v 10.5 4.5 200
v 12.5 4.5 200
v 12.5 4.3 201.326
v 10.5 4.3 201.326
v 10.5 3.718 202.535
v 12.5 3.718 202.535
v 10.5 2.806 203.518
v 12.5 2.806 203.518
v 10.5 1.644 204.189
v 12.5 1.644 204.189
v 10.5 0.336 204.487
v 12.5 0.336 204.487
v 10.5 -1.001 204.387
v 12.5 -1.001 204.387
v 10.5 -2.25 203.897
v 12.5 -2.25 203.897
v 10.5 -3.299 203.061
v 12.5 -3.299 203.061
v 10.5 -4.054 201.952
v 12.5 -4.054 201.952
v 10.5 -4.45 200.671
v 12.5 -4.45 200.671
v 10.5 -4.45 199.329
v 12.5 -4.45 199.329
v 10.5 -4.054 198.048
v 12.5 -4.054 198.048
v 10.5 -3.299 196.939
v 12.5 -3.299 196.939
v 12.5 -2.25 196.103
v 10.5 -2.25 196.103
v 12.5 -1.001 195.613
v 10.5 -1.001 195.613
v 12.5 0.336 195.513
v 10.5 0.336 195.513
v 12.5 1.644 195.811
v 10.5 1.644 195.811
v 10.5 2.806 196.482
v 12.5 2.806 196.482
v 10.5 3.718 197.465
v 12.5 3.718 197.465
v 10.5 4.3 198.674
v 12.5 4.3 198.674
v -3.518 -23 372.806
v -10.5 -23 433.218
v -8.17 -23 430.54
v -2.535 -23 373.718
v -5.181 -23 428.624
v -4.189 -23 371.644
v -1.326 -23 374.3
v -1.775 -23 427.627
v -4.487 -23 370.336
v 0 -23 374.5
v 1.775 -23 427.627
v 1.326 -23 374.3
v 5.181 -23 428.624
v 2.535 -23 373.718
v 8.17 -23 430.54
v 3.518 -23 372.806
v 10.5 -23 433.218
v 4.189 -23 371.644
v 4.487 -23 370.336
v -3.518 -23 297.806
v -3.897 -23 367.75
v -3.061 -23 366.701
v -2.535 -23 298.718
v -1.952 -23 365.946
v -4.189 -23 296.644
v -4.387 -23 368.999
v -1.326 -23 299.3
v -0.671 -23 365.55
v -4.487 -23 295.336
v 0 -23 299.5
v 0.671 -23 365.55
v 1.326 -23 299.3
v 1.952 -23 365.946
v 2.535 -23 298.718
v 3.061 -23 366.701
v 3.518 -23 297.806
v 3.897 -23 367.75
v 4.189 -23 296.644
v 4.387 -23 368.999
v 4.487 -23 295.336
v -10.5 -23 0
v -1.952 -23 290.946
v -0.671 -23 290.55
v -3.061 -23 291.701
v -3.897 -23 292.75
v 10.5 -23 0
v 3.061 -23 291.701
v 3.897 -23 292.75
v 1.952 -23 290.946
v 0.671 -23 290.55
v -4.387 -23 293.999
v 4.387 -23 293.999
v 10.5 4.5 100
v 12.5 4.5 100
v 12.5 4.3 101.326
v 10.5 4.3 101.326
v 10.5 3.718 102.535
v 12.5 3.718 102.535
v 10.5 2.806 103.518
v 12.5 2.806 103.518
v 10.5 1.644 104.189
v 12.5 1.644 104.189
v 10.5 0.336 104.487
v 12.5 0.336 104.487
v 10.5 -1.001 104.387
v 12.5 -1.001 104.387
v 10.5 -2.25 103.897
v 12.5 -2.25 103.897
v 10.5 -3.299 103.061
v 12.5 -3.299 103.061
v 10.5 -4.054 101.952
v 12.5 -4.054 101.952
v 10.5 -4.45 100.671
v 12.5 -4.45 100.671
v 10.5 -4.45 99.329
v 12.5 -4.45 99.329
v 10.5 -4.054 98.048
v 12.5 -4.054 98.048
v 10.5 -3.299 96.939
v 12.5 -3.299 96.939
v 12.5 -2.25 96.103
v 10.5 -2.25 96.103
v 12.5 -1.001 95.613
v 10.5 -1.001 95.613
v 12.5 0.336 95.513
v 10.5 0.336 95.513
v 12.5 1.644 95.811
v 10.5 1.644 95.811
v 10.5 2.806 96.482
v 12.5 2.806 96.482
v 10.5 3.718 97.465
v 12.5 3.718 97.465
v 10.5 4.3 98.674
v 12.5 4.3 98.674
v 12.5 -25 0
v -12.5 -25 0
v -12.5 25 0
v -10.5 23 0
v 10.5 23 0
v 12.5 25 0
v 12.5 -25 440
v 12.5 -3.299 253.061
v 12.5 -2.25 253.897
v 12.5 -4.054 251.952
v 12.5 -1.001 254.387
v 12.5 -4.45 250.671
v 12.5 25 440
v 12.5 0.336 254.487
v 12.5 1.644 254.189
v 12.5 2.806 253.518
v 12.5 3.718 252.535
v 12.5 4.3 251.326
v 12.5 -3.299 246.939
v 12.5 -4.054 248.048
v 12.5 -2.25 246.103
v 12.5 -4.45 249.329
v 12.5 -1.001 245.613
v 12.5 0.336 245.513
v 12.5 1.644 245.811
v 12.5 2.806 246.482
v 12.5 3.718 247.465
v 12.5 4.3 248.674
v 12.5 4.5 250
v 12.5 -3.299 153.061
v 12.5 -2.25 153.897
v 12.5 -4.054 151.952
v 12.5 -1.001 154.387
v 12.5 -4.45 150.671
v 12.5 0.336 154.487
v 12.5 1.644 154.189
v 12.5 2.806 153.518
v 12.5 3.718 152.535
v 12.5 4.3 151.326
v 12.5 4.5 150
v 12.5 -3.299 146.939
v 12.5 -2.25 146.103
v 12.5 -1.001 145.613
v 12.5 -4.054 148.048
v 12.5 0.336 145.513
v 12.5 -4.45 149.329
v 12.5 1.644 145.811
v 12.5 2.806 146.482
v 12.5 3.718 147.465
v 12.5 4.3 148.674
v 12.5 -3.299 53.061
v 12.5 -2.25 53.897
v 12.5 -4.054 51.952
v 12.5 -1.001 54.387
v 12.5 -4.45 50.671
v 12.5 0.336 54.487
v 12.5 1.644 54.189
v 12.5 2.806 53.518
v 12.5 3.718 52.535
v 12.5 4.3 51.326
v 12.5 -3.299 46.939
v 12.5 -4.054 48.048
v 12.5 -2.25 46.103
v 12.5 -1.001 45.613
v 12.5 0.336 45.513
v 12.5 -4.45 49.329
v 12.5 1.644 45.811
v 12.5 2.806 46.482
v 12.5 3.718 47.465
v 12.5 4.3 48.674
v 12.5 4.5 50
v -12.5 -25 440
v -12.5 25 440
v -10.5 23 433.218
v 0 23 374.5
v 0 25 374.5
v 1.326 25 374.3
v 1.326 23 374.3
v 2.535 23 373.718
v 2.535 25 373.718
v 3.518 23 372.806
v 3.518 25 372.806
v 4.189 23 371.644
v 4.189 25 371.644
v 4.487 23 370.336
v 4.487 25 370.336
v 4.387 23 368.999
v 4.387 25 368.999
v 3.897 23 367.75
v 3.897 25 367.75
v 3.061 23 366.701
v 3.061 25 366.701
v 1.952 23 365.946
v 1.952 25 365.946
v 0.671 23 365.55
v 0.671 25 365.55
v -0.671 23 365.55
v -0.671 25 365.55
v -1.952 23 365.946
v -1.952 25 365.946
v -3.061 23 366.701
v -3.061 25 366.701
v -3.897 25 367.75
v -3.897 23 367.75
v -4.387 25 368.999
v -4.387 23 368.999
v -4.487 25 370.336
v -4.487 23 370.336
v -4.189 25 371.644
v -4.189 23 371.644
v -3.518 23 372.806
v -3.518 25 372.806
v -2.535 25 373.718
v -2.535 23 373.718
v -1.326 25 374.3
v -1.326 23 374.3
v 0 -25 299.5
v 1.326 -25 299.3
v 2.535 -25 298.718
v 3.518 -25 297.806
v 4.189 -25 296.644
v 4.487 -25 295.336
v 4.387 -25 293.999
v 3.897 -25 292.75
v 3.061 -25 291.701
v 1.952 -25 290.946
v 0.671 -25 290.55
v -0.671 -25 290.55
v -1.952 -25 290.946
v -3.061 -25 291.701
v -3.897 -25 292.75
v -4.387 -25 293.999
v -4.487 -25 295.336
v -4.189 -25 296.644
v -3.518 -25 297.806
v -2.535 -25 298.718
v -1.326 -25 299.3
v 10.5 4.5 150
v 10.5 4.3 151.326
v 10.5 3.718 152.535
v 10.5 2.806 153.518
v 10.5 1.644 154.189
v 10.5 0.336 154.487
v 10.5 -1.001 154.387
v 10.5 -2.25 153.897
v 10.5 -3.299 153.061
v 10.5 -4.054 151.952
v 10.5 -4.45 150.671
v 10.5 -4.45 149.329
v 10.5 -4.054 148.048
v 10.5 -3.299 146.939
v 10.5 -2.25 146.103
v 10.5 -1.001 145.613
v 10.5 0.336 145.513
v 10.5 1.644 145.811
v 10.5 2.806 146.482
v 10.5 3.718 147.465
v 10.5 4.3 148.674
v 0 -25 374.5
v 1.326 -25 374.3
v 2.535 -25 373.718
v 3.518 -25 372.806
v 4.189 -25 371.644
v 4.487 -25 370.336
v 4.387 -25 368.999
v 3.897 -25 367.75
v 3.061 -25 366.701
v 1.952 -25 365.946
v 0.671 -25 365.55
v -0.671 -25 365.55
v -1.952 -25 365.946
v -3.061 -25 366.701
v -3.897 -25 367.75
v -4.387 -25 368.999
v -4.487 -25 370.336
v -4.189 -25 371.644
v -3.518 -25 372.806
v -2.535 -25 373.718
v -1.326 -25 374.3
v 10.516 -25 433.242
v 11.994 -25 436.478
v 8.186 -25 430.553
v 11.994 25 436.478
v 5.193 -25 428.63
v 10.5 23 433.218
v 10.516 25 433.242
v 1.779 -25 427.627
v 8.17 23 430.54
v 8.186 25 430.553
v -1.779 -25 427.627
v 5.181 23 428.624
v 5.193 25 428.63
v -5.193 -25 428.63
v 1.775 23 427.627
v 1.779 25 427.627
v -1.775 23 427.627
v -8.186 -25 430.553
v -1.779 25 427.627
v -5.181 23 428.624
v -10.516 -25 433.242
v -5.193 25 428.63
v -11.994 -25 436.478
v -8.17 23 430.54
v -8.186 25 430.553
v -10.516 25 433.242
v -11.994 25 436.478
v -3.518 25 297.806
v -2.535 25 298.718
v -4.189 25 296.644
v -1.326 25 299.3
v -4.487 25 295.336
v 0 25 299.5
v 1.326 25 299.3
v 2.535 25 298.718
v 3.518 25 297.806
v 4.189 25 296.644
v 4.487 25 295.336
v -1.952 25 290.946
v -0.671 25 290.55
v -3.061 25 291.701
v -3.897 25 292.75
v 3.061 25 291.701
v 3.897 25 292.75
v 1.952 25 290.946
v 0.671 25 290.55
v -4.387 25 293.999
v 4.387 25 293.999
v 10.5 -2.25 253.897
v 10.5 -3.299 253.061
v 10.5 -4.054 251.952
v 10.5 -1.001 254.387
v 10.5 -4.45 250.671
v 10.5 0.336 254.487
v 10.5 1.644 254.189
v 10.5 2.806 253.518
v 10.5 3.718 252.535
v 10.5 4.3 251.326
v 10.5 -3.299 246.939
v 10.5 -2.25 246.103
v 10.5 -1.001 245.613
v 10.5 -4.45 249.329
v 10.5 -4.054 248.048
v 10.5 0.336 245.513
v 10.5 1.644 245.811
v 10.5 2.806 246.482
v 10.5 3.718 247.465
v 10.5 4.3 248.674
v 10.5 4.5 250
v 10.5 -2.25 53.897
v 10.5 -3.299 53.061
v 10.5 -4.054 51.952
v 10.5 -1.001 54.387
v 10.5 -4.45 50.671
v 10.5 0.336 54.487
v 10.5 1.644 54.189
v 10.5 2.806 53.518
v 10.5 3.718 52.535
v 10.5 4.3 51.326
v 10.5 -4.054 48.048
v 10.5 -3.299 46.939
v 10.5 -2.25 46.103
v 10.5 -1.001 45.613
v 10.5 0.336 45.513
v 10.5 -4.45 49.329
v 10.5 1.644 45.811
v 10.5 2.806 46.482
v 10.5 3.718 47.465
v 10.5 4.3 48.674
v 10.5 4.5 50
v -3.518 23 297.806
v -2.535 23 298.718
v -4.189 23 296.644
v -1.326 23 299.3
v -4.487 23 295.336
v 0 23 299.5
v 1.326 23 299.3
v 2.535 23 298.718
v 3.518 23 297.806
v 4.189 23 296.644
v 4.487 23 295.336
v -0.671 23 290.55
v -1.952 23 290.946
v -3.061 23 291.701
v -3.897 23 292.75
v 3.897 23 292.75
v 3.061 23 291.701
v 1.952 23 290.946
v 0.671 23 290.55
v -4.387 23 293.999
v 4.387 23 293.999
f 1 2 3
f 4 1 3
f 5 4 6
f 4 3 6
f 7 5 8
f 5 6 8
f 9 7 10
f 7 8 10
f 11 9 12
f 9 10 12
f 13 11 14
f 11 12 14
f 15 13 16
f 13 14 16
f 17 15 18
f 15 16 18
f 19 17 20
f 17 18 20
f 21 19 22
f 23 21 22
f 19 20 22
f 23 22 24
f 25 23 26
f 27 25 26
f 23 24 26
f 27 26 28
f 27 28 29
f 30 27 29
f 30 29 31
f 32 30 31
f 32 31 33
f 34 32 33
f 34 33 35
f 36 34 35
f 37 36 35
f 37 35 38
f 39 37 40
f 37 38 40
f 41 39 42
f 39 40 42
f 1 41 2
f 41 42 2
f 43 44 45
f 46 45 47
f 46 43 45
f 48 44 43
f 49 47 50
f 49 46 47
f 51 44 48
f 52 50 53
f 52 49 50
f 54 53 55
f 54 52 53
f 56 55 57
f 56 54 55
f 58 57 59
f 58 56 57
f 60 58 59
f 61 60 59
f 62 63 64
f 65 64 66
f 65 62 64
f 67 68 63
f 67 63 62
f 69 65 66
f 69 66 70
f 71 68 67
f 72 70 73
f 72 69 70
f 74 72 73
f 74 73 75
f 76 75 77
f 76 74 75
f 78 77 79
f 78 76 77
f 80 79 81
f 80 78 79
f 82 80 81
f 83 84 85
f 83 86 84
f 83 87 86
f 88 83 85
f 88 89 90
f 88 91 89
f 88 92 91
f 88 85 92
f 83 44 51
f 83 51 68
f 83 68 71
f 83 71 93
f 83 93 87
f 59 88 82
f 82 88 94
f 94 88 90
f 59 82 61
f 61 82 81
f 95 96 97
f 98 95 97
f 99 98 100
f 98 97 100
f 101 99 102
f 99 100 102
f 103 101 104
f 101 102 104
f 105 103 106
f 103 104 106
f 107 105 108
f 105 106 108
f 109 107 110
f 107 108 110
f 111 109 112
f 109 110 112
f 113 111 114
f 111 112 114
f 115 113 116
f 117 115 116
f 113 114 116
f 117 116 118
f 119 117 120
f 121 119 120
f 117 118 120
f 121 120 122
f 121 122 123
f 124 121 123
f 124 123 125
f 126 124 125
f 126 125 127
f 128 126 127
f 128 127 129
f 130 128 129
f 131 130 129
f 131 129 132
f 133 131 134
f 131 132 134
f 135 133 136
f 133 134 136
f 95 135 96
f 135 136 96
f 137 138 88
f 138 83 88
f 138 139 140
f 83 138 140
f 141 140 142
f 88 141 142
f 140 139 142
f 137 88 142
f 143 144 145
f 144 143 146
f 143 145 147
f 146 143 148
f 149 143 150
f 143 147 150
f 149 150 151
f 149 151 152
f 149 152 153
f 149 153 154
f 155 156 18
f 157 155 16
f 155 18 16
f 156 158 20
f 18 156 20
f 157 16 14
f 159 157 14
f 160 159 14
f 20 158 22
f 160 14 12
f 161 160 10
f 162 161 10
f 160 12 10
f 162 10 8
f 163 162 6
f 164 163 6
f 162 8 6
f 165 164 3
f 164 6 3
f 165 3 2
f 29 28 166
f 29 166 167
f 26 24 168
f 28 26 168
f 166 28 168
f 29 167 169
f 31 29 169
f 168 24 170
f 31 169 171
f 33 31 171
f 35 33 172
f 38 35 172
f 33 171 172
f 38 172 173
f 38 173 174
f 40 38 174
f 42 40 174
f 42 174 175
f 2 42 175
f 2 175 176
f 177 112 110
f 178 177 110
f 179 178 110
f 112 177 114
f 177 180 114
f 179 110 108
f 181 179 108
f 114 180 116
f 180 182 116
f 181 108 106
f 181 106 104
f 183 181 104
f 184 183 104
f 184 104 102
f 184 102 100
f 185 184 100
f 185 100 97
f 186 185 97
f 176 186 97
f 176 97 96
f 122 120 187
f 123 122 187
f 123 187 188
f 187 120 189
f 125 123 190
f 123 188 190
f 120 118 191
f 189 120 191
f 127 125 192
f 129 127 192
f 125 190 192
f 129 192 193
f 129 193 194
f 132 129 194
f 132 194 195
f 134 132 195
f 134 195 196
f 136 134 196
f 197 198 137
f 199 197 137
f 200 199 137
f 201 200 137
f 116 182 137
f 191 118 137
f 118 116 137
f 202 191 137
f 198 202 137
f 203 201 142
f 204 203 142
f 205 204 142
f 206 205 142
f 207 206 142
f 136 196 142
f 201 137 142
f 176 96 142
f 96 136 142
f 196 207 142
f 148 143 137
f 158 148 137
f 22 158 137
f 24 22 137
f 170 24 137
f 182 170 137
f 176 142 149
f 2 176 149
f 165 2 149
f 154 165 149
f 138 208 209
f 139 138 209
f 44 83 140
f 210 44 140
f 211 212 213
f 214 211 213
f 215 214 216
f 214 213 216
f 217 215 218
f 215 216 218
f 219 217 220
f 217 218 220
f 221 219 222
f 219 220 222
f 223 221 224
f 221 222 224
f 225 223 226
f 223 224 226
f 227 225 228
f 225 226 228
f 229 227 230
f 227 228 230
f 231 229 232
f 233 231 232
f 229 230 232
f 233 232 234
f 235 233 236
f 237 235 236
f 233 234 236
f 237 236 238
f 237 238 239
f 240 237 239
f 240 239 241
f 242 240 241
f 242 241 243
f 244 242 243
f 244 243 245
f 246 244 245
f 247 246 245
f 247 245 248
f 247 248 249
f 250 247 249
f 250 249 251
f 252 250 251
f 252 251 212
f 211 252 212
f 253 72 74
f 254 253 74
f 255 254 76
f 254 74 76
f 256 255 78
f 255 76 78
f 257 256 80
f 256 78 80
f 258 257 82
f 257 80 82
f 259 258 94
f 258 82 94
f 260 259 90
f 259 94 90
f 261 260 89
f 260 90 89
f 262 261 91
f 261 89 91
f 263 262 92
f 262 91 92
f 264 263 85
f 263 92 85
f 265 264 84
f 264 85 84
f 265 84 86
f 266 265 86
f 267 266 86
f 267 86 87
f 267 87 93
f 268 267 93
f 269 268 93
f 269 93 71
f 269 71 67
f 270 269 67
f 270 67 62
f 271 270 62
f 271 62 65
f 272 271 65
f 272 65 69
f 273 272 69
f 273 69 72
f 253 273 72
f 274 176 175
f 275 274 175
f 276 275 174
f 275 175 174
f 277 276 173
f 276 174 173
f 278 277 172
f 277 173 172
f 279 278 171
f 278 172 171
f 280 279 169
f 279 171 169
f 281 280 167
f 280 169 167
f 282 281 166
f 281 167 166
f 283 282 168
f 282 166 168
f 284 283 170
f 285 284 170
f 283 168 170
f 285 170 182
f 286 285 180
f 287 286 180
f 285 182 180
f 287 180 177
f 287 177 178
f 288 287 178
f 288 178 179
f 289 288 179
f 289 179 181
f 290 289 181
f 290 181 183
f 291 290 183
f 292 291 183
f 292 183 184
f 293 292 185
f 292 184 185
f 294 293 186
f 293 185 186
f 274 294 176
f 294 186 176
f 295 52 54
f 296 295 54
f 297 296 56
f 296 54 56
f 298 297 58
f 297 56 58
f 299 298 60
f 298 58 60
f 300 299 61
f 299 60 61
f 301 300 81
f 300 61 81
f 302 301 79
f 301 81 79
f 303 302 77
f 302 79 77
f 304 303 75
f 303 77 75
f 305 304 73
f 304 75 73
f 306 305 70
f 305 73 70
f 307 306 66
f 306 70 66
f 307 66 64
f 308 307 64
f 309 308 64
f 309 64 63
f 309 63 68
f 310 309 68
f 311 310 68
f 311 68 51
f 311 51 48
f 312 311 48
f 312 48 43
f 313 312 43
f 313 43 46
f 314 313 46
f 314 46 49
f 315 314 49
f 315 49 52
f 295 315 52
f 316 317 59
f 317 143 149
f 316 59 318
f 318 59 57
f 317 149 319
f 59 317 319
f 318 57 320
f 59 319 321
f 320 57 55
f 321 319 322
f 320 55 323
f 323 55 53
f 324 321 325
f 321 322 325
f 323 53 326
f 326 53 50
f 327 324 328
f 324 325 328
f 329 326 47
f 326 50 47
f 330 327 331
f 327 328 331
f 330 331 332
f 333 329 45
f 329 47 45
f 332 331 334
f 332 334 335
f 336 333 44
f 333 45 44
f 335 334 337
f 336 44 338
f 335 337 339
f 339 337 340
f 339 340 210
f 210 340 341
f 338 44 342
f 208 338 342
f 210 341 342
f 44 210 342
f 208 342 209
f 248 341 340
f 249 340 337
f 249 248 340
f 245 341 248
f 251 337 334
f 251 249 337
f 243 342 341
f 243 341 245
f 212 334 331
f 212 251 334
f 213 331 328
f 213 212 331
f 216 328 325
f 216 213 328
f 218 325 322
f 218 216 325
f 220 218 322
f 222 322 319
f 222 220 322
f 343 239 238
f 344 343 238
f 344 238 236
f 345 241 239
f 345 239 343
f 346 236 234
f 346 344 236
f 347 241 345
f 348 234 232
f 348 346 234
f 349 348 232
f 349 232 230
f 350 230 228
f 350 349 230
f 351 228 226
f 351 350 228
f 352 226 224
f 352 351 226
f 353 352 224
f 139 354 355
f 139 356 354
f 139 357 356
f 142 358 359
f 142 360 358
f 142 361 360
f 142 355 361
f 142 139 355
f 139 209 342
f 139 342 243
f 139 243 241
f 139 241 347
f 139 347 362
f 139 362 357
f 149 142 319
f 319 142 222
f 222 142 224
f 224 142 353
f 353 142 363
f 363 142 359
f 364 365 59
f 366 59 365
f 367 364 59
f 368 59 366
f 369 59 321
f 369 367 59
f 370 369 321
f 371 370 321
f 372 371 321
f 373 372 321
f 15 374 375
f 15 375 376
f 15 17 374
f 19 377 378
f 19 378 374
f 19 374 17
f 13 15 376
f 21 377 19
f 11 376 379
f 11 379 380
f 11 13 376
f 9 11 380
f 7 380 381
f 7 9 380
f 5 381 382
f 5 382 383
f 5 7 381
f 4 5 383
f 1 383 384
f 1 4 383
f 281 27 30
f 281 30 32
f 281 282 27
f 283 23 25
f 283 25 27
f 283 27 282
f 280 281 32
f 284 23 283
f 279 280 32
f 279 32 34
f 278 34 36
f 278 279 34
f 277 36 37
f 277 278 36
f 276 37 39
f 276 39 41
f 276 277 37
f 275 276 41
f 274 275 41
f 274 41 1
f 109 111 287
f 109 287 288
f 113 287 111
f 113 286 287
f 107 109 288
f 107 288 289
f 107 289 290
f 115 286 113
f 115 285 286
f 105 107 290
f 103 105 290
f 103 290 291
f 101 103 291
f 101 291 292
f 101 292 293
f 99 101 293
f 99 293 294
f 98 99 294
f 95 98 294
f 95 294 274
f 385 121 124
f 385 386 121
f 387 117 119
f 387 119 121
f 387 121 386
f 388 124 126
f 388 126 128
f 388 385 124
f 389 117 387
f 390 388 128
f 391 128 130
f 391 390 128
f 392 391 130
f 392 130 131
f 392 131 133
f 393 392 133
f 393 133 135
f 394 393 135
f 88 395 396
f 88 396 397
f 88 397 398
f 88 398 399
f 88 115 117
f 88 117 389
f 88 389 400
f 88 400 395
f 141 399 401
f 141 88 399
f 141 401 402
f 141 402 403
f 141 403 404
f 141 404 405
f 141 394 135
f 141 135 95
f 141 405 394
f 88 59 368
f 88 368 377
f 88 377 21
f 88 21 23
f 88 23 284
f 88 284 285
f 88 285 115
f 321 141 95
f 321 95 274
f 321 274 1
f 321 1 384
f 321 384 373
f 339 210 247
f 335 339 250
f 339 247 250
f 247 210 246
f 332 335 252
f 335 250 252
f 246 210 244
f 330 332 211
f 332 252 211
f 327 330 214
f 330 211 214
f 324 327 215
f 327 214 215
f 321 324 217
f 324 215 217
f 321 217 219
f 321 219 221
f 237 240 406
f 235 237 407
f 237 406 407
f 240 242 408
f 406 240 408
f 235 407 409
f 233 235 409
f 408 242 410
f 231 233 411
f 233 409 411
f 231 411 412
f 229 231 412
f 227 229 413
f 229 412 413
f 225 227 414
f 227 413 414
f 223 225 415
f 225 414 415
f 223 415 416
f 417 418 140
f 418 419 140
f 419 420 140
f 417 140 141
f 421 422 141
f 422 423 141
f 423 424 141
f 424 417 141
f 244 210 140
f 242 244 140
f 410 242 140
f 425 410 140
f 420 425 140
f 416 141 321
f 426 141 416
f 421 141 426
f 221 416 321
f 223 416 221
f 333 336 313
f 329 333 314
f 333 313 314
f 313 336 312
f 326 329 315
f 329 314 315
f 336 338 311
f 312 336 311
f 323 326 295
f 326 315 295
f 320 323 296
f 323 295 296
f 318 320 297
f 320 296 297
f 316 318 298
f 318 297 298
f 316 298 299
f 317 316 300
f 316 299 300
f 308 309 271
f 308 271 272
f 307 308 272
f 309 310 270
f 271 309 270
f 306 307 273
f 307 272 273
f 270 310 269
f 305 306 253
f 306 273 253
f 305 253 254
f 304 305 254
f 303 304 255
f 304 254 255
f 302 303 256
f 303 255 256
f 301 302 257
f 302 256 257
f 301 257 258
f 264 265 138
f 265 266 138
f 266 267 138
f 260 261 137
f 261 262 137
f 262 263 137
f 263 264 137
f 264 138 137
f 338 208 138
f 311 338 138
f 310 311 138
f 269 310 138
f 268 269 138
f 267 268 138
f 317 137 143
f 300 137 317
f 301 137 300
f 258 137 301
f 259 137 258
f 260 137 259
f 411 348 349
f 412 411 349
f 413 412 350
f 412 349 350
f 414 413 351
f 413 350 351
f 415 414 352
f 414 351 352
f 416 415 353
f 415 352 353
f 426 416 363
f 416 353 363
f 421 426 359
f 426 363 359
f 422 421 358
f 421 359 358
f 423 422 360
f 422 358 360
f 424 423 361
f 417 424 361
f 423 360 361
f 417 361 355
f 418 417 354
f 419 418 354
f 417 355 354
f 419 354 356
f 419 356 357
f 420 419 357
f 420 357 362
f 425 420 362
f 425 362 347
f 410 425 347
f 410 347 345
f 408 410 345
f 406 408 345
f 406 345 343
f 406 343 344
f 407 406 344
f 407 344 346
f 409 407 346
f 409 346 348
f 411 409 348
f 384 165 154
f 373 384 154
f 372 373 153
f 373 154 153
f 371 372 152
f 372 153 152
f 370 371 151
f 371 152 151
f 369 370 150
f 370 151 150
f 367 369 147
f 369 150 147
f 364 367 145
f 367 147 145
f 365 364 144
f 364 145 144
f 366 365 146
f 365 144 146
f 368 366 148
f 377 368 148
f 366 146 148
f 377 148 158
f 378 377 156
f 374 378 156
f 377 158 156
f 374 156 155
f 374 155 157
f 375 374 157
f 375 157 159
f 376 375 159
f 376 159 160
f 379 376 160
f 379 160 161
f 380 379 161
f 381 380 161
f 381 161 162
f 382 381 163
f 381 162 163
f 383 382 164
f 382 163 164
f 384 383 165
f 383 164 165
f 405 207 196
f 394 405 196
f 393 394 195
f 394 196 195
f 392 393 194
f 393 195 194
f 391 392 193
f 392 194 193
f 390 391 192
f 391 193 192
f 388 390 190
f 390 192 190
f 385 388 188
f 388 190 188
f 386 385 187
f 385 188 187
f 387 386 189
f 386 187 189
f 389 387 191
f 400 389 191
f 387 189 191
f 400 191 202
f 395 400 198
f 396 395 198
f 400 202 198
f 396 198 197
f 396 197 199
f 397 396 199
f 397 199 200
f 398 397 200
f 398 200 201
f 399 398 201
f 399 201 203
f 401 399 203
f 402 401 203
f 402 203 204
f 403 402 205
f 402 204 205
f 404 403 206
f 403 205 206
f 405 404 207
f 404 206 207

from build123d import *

# Parameters (mm, degrees)
SKETCH_1_W          = 25
SKETCH_1_H          = 50
SKETCH_1_W_2        = 21
SKETCH_1_H_2        = 46
EXTRUDE_1_DEPTH     = 440
SKETCH_2_R          = 12.5
SKETCH_2_R_2        = 4.5
CUT_EXTRUDE_1_DEPTH = 50
SKETCH_3_R          = 4.5
CUT_EXTRUDE_2_DEPTH = 2


with BuildPart() as part:
    # Эскиз1 → Бобышка-Вытянуть1 (new body)
    with BuildSketch(Plane.XY):
        Rectangle(SKETCH_1_W, SKETCH_1_H)
        Rectangle(SKETCH_1_W_2, SKETCH_1_H_2, mode=Mode.SUBTRACT)
    extrude(amount=EXTRUDE_1_DEPTH)

    # Эскиз2 → Вырез-Вытянуть1 (cut)
    with BuildSketch(Plane(origin=(0, 25, 0), x_dir=(1, 0, 0), z_dir=(0, 1, 0))):
        with Locations((0, -440)):
            Circle(SKETCH_2_R)
        with Locations(Location((0, -370, 0), (0, 0, 270))):  # turned: the seam where the file's is
            Circle(SKETCH_2_R_2)
        with Locations(Location((0, -295, 0), (0, 0, 270))):  # turned: the seam where the file's is
            Circle(SKETCH_2_R_2)
    extrude(amount=-CUT_EXTRUDE_1_DEPTH, mode=Mode.SUBTRACT)

    # Эскиз3 → Вырез-Вытянуть2 (cut)
    with BuildSketch(Plane(origin=(12.5, 0, 0), x_dir=(0, 0, -1), z_dir=(1, 0, 0))):
        with Locations(Location((-50, 0, 0), (0, 0, 90))):  # turned: the seam where the file's is
            Circle(SKETCH_3_R)
        with Locations(Location((-100, 0, 0), (0, 0, 90))):  # turned: the seam where the file's is
            Circle(SKETCH_3_R)
        with Locations(Location((-150, 0, 0), (0, 0, 90))):  # turned: the seam where the file's is
            Circle(SKETCH_3_R)
        with Locations(Location((-200, 0, 0), (0, 0, 90))):  # turned: the seam where the file's is
            Circle(SKETCH_3_R)
        with Locations(Location((-250, 0, 0), (0, 0, 90))):  # turned: the seam where the file's is
            Circle(SKETCH_3_R)
    extrude(amount=-CUT_EXTRUDE_2_DEPTH, mode=Mode.SUBTRACT)


solid = part.part
